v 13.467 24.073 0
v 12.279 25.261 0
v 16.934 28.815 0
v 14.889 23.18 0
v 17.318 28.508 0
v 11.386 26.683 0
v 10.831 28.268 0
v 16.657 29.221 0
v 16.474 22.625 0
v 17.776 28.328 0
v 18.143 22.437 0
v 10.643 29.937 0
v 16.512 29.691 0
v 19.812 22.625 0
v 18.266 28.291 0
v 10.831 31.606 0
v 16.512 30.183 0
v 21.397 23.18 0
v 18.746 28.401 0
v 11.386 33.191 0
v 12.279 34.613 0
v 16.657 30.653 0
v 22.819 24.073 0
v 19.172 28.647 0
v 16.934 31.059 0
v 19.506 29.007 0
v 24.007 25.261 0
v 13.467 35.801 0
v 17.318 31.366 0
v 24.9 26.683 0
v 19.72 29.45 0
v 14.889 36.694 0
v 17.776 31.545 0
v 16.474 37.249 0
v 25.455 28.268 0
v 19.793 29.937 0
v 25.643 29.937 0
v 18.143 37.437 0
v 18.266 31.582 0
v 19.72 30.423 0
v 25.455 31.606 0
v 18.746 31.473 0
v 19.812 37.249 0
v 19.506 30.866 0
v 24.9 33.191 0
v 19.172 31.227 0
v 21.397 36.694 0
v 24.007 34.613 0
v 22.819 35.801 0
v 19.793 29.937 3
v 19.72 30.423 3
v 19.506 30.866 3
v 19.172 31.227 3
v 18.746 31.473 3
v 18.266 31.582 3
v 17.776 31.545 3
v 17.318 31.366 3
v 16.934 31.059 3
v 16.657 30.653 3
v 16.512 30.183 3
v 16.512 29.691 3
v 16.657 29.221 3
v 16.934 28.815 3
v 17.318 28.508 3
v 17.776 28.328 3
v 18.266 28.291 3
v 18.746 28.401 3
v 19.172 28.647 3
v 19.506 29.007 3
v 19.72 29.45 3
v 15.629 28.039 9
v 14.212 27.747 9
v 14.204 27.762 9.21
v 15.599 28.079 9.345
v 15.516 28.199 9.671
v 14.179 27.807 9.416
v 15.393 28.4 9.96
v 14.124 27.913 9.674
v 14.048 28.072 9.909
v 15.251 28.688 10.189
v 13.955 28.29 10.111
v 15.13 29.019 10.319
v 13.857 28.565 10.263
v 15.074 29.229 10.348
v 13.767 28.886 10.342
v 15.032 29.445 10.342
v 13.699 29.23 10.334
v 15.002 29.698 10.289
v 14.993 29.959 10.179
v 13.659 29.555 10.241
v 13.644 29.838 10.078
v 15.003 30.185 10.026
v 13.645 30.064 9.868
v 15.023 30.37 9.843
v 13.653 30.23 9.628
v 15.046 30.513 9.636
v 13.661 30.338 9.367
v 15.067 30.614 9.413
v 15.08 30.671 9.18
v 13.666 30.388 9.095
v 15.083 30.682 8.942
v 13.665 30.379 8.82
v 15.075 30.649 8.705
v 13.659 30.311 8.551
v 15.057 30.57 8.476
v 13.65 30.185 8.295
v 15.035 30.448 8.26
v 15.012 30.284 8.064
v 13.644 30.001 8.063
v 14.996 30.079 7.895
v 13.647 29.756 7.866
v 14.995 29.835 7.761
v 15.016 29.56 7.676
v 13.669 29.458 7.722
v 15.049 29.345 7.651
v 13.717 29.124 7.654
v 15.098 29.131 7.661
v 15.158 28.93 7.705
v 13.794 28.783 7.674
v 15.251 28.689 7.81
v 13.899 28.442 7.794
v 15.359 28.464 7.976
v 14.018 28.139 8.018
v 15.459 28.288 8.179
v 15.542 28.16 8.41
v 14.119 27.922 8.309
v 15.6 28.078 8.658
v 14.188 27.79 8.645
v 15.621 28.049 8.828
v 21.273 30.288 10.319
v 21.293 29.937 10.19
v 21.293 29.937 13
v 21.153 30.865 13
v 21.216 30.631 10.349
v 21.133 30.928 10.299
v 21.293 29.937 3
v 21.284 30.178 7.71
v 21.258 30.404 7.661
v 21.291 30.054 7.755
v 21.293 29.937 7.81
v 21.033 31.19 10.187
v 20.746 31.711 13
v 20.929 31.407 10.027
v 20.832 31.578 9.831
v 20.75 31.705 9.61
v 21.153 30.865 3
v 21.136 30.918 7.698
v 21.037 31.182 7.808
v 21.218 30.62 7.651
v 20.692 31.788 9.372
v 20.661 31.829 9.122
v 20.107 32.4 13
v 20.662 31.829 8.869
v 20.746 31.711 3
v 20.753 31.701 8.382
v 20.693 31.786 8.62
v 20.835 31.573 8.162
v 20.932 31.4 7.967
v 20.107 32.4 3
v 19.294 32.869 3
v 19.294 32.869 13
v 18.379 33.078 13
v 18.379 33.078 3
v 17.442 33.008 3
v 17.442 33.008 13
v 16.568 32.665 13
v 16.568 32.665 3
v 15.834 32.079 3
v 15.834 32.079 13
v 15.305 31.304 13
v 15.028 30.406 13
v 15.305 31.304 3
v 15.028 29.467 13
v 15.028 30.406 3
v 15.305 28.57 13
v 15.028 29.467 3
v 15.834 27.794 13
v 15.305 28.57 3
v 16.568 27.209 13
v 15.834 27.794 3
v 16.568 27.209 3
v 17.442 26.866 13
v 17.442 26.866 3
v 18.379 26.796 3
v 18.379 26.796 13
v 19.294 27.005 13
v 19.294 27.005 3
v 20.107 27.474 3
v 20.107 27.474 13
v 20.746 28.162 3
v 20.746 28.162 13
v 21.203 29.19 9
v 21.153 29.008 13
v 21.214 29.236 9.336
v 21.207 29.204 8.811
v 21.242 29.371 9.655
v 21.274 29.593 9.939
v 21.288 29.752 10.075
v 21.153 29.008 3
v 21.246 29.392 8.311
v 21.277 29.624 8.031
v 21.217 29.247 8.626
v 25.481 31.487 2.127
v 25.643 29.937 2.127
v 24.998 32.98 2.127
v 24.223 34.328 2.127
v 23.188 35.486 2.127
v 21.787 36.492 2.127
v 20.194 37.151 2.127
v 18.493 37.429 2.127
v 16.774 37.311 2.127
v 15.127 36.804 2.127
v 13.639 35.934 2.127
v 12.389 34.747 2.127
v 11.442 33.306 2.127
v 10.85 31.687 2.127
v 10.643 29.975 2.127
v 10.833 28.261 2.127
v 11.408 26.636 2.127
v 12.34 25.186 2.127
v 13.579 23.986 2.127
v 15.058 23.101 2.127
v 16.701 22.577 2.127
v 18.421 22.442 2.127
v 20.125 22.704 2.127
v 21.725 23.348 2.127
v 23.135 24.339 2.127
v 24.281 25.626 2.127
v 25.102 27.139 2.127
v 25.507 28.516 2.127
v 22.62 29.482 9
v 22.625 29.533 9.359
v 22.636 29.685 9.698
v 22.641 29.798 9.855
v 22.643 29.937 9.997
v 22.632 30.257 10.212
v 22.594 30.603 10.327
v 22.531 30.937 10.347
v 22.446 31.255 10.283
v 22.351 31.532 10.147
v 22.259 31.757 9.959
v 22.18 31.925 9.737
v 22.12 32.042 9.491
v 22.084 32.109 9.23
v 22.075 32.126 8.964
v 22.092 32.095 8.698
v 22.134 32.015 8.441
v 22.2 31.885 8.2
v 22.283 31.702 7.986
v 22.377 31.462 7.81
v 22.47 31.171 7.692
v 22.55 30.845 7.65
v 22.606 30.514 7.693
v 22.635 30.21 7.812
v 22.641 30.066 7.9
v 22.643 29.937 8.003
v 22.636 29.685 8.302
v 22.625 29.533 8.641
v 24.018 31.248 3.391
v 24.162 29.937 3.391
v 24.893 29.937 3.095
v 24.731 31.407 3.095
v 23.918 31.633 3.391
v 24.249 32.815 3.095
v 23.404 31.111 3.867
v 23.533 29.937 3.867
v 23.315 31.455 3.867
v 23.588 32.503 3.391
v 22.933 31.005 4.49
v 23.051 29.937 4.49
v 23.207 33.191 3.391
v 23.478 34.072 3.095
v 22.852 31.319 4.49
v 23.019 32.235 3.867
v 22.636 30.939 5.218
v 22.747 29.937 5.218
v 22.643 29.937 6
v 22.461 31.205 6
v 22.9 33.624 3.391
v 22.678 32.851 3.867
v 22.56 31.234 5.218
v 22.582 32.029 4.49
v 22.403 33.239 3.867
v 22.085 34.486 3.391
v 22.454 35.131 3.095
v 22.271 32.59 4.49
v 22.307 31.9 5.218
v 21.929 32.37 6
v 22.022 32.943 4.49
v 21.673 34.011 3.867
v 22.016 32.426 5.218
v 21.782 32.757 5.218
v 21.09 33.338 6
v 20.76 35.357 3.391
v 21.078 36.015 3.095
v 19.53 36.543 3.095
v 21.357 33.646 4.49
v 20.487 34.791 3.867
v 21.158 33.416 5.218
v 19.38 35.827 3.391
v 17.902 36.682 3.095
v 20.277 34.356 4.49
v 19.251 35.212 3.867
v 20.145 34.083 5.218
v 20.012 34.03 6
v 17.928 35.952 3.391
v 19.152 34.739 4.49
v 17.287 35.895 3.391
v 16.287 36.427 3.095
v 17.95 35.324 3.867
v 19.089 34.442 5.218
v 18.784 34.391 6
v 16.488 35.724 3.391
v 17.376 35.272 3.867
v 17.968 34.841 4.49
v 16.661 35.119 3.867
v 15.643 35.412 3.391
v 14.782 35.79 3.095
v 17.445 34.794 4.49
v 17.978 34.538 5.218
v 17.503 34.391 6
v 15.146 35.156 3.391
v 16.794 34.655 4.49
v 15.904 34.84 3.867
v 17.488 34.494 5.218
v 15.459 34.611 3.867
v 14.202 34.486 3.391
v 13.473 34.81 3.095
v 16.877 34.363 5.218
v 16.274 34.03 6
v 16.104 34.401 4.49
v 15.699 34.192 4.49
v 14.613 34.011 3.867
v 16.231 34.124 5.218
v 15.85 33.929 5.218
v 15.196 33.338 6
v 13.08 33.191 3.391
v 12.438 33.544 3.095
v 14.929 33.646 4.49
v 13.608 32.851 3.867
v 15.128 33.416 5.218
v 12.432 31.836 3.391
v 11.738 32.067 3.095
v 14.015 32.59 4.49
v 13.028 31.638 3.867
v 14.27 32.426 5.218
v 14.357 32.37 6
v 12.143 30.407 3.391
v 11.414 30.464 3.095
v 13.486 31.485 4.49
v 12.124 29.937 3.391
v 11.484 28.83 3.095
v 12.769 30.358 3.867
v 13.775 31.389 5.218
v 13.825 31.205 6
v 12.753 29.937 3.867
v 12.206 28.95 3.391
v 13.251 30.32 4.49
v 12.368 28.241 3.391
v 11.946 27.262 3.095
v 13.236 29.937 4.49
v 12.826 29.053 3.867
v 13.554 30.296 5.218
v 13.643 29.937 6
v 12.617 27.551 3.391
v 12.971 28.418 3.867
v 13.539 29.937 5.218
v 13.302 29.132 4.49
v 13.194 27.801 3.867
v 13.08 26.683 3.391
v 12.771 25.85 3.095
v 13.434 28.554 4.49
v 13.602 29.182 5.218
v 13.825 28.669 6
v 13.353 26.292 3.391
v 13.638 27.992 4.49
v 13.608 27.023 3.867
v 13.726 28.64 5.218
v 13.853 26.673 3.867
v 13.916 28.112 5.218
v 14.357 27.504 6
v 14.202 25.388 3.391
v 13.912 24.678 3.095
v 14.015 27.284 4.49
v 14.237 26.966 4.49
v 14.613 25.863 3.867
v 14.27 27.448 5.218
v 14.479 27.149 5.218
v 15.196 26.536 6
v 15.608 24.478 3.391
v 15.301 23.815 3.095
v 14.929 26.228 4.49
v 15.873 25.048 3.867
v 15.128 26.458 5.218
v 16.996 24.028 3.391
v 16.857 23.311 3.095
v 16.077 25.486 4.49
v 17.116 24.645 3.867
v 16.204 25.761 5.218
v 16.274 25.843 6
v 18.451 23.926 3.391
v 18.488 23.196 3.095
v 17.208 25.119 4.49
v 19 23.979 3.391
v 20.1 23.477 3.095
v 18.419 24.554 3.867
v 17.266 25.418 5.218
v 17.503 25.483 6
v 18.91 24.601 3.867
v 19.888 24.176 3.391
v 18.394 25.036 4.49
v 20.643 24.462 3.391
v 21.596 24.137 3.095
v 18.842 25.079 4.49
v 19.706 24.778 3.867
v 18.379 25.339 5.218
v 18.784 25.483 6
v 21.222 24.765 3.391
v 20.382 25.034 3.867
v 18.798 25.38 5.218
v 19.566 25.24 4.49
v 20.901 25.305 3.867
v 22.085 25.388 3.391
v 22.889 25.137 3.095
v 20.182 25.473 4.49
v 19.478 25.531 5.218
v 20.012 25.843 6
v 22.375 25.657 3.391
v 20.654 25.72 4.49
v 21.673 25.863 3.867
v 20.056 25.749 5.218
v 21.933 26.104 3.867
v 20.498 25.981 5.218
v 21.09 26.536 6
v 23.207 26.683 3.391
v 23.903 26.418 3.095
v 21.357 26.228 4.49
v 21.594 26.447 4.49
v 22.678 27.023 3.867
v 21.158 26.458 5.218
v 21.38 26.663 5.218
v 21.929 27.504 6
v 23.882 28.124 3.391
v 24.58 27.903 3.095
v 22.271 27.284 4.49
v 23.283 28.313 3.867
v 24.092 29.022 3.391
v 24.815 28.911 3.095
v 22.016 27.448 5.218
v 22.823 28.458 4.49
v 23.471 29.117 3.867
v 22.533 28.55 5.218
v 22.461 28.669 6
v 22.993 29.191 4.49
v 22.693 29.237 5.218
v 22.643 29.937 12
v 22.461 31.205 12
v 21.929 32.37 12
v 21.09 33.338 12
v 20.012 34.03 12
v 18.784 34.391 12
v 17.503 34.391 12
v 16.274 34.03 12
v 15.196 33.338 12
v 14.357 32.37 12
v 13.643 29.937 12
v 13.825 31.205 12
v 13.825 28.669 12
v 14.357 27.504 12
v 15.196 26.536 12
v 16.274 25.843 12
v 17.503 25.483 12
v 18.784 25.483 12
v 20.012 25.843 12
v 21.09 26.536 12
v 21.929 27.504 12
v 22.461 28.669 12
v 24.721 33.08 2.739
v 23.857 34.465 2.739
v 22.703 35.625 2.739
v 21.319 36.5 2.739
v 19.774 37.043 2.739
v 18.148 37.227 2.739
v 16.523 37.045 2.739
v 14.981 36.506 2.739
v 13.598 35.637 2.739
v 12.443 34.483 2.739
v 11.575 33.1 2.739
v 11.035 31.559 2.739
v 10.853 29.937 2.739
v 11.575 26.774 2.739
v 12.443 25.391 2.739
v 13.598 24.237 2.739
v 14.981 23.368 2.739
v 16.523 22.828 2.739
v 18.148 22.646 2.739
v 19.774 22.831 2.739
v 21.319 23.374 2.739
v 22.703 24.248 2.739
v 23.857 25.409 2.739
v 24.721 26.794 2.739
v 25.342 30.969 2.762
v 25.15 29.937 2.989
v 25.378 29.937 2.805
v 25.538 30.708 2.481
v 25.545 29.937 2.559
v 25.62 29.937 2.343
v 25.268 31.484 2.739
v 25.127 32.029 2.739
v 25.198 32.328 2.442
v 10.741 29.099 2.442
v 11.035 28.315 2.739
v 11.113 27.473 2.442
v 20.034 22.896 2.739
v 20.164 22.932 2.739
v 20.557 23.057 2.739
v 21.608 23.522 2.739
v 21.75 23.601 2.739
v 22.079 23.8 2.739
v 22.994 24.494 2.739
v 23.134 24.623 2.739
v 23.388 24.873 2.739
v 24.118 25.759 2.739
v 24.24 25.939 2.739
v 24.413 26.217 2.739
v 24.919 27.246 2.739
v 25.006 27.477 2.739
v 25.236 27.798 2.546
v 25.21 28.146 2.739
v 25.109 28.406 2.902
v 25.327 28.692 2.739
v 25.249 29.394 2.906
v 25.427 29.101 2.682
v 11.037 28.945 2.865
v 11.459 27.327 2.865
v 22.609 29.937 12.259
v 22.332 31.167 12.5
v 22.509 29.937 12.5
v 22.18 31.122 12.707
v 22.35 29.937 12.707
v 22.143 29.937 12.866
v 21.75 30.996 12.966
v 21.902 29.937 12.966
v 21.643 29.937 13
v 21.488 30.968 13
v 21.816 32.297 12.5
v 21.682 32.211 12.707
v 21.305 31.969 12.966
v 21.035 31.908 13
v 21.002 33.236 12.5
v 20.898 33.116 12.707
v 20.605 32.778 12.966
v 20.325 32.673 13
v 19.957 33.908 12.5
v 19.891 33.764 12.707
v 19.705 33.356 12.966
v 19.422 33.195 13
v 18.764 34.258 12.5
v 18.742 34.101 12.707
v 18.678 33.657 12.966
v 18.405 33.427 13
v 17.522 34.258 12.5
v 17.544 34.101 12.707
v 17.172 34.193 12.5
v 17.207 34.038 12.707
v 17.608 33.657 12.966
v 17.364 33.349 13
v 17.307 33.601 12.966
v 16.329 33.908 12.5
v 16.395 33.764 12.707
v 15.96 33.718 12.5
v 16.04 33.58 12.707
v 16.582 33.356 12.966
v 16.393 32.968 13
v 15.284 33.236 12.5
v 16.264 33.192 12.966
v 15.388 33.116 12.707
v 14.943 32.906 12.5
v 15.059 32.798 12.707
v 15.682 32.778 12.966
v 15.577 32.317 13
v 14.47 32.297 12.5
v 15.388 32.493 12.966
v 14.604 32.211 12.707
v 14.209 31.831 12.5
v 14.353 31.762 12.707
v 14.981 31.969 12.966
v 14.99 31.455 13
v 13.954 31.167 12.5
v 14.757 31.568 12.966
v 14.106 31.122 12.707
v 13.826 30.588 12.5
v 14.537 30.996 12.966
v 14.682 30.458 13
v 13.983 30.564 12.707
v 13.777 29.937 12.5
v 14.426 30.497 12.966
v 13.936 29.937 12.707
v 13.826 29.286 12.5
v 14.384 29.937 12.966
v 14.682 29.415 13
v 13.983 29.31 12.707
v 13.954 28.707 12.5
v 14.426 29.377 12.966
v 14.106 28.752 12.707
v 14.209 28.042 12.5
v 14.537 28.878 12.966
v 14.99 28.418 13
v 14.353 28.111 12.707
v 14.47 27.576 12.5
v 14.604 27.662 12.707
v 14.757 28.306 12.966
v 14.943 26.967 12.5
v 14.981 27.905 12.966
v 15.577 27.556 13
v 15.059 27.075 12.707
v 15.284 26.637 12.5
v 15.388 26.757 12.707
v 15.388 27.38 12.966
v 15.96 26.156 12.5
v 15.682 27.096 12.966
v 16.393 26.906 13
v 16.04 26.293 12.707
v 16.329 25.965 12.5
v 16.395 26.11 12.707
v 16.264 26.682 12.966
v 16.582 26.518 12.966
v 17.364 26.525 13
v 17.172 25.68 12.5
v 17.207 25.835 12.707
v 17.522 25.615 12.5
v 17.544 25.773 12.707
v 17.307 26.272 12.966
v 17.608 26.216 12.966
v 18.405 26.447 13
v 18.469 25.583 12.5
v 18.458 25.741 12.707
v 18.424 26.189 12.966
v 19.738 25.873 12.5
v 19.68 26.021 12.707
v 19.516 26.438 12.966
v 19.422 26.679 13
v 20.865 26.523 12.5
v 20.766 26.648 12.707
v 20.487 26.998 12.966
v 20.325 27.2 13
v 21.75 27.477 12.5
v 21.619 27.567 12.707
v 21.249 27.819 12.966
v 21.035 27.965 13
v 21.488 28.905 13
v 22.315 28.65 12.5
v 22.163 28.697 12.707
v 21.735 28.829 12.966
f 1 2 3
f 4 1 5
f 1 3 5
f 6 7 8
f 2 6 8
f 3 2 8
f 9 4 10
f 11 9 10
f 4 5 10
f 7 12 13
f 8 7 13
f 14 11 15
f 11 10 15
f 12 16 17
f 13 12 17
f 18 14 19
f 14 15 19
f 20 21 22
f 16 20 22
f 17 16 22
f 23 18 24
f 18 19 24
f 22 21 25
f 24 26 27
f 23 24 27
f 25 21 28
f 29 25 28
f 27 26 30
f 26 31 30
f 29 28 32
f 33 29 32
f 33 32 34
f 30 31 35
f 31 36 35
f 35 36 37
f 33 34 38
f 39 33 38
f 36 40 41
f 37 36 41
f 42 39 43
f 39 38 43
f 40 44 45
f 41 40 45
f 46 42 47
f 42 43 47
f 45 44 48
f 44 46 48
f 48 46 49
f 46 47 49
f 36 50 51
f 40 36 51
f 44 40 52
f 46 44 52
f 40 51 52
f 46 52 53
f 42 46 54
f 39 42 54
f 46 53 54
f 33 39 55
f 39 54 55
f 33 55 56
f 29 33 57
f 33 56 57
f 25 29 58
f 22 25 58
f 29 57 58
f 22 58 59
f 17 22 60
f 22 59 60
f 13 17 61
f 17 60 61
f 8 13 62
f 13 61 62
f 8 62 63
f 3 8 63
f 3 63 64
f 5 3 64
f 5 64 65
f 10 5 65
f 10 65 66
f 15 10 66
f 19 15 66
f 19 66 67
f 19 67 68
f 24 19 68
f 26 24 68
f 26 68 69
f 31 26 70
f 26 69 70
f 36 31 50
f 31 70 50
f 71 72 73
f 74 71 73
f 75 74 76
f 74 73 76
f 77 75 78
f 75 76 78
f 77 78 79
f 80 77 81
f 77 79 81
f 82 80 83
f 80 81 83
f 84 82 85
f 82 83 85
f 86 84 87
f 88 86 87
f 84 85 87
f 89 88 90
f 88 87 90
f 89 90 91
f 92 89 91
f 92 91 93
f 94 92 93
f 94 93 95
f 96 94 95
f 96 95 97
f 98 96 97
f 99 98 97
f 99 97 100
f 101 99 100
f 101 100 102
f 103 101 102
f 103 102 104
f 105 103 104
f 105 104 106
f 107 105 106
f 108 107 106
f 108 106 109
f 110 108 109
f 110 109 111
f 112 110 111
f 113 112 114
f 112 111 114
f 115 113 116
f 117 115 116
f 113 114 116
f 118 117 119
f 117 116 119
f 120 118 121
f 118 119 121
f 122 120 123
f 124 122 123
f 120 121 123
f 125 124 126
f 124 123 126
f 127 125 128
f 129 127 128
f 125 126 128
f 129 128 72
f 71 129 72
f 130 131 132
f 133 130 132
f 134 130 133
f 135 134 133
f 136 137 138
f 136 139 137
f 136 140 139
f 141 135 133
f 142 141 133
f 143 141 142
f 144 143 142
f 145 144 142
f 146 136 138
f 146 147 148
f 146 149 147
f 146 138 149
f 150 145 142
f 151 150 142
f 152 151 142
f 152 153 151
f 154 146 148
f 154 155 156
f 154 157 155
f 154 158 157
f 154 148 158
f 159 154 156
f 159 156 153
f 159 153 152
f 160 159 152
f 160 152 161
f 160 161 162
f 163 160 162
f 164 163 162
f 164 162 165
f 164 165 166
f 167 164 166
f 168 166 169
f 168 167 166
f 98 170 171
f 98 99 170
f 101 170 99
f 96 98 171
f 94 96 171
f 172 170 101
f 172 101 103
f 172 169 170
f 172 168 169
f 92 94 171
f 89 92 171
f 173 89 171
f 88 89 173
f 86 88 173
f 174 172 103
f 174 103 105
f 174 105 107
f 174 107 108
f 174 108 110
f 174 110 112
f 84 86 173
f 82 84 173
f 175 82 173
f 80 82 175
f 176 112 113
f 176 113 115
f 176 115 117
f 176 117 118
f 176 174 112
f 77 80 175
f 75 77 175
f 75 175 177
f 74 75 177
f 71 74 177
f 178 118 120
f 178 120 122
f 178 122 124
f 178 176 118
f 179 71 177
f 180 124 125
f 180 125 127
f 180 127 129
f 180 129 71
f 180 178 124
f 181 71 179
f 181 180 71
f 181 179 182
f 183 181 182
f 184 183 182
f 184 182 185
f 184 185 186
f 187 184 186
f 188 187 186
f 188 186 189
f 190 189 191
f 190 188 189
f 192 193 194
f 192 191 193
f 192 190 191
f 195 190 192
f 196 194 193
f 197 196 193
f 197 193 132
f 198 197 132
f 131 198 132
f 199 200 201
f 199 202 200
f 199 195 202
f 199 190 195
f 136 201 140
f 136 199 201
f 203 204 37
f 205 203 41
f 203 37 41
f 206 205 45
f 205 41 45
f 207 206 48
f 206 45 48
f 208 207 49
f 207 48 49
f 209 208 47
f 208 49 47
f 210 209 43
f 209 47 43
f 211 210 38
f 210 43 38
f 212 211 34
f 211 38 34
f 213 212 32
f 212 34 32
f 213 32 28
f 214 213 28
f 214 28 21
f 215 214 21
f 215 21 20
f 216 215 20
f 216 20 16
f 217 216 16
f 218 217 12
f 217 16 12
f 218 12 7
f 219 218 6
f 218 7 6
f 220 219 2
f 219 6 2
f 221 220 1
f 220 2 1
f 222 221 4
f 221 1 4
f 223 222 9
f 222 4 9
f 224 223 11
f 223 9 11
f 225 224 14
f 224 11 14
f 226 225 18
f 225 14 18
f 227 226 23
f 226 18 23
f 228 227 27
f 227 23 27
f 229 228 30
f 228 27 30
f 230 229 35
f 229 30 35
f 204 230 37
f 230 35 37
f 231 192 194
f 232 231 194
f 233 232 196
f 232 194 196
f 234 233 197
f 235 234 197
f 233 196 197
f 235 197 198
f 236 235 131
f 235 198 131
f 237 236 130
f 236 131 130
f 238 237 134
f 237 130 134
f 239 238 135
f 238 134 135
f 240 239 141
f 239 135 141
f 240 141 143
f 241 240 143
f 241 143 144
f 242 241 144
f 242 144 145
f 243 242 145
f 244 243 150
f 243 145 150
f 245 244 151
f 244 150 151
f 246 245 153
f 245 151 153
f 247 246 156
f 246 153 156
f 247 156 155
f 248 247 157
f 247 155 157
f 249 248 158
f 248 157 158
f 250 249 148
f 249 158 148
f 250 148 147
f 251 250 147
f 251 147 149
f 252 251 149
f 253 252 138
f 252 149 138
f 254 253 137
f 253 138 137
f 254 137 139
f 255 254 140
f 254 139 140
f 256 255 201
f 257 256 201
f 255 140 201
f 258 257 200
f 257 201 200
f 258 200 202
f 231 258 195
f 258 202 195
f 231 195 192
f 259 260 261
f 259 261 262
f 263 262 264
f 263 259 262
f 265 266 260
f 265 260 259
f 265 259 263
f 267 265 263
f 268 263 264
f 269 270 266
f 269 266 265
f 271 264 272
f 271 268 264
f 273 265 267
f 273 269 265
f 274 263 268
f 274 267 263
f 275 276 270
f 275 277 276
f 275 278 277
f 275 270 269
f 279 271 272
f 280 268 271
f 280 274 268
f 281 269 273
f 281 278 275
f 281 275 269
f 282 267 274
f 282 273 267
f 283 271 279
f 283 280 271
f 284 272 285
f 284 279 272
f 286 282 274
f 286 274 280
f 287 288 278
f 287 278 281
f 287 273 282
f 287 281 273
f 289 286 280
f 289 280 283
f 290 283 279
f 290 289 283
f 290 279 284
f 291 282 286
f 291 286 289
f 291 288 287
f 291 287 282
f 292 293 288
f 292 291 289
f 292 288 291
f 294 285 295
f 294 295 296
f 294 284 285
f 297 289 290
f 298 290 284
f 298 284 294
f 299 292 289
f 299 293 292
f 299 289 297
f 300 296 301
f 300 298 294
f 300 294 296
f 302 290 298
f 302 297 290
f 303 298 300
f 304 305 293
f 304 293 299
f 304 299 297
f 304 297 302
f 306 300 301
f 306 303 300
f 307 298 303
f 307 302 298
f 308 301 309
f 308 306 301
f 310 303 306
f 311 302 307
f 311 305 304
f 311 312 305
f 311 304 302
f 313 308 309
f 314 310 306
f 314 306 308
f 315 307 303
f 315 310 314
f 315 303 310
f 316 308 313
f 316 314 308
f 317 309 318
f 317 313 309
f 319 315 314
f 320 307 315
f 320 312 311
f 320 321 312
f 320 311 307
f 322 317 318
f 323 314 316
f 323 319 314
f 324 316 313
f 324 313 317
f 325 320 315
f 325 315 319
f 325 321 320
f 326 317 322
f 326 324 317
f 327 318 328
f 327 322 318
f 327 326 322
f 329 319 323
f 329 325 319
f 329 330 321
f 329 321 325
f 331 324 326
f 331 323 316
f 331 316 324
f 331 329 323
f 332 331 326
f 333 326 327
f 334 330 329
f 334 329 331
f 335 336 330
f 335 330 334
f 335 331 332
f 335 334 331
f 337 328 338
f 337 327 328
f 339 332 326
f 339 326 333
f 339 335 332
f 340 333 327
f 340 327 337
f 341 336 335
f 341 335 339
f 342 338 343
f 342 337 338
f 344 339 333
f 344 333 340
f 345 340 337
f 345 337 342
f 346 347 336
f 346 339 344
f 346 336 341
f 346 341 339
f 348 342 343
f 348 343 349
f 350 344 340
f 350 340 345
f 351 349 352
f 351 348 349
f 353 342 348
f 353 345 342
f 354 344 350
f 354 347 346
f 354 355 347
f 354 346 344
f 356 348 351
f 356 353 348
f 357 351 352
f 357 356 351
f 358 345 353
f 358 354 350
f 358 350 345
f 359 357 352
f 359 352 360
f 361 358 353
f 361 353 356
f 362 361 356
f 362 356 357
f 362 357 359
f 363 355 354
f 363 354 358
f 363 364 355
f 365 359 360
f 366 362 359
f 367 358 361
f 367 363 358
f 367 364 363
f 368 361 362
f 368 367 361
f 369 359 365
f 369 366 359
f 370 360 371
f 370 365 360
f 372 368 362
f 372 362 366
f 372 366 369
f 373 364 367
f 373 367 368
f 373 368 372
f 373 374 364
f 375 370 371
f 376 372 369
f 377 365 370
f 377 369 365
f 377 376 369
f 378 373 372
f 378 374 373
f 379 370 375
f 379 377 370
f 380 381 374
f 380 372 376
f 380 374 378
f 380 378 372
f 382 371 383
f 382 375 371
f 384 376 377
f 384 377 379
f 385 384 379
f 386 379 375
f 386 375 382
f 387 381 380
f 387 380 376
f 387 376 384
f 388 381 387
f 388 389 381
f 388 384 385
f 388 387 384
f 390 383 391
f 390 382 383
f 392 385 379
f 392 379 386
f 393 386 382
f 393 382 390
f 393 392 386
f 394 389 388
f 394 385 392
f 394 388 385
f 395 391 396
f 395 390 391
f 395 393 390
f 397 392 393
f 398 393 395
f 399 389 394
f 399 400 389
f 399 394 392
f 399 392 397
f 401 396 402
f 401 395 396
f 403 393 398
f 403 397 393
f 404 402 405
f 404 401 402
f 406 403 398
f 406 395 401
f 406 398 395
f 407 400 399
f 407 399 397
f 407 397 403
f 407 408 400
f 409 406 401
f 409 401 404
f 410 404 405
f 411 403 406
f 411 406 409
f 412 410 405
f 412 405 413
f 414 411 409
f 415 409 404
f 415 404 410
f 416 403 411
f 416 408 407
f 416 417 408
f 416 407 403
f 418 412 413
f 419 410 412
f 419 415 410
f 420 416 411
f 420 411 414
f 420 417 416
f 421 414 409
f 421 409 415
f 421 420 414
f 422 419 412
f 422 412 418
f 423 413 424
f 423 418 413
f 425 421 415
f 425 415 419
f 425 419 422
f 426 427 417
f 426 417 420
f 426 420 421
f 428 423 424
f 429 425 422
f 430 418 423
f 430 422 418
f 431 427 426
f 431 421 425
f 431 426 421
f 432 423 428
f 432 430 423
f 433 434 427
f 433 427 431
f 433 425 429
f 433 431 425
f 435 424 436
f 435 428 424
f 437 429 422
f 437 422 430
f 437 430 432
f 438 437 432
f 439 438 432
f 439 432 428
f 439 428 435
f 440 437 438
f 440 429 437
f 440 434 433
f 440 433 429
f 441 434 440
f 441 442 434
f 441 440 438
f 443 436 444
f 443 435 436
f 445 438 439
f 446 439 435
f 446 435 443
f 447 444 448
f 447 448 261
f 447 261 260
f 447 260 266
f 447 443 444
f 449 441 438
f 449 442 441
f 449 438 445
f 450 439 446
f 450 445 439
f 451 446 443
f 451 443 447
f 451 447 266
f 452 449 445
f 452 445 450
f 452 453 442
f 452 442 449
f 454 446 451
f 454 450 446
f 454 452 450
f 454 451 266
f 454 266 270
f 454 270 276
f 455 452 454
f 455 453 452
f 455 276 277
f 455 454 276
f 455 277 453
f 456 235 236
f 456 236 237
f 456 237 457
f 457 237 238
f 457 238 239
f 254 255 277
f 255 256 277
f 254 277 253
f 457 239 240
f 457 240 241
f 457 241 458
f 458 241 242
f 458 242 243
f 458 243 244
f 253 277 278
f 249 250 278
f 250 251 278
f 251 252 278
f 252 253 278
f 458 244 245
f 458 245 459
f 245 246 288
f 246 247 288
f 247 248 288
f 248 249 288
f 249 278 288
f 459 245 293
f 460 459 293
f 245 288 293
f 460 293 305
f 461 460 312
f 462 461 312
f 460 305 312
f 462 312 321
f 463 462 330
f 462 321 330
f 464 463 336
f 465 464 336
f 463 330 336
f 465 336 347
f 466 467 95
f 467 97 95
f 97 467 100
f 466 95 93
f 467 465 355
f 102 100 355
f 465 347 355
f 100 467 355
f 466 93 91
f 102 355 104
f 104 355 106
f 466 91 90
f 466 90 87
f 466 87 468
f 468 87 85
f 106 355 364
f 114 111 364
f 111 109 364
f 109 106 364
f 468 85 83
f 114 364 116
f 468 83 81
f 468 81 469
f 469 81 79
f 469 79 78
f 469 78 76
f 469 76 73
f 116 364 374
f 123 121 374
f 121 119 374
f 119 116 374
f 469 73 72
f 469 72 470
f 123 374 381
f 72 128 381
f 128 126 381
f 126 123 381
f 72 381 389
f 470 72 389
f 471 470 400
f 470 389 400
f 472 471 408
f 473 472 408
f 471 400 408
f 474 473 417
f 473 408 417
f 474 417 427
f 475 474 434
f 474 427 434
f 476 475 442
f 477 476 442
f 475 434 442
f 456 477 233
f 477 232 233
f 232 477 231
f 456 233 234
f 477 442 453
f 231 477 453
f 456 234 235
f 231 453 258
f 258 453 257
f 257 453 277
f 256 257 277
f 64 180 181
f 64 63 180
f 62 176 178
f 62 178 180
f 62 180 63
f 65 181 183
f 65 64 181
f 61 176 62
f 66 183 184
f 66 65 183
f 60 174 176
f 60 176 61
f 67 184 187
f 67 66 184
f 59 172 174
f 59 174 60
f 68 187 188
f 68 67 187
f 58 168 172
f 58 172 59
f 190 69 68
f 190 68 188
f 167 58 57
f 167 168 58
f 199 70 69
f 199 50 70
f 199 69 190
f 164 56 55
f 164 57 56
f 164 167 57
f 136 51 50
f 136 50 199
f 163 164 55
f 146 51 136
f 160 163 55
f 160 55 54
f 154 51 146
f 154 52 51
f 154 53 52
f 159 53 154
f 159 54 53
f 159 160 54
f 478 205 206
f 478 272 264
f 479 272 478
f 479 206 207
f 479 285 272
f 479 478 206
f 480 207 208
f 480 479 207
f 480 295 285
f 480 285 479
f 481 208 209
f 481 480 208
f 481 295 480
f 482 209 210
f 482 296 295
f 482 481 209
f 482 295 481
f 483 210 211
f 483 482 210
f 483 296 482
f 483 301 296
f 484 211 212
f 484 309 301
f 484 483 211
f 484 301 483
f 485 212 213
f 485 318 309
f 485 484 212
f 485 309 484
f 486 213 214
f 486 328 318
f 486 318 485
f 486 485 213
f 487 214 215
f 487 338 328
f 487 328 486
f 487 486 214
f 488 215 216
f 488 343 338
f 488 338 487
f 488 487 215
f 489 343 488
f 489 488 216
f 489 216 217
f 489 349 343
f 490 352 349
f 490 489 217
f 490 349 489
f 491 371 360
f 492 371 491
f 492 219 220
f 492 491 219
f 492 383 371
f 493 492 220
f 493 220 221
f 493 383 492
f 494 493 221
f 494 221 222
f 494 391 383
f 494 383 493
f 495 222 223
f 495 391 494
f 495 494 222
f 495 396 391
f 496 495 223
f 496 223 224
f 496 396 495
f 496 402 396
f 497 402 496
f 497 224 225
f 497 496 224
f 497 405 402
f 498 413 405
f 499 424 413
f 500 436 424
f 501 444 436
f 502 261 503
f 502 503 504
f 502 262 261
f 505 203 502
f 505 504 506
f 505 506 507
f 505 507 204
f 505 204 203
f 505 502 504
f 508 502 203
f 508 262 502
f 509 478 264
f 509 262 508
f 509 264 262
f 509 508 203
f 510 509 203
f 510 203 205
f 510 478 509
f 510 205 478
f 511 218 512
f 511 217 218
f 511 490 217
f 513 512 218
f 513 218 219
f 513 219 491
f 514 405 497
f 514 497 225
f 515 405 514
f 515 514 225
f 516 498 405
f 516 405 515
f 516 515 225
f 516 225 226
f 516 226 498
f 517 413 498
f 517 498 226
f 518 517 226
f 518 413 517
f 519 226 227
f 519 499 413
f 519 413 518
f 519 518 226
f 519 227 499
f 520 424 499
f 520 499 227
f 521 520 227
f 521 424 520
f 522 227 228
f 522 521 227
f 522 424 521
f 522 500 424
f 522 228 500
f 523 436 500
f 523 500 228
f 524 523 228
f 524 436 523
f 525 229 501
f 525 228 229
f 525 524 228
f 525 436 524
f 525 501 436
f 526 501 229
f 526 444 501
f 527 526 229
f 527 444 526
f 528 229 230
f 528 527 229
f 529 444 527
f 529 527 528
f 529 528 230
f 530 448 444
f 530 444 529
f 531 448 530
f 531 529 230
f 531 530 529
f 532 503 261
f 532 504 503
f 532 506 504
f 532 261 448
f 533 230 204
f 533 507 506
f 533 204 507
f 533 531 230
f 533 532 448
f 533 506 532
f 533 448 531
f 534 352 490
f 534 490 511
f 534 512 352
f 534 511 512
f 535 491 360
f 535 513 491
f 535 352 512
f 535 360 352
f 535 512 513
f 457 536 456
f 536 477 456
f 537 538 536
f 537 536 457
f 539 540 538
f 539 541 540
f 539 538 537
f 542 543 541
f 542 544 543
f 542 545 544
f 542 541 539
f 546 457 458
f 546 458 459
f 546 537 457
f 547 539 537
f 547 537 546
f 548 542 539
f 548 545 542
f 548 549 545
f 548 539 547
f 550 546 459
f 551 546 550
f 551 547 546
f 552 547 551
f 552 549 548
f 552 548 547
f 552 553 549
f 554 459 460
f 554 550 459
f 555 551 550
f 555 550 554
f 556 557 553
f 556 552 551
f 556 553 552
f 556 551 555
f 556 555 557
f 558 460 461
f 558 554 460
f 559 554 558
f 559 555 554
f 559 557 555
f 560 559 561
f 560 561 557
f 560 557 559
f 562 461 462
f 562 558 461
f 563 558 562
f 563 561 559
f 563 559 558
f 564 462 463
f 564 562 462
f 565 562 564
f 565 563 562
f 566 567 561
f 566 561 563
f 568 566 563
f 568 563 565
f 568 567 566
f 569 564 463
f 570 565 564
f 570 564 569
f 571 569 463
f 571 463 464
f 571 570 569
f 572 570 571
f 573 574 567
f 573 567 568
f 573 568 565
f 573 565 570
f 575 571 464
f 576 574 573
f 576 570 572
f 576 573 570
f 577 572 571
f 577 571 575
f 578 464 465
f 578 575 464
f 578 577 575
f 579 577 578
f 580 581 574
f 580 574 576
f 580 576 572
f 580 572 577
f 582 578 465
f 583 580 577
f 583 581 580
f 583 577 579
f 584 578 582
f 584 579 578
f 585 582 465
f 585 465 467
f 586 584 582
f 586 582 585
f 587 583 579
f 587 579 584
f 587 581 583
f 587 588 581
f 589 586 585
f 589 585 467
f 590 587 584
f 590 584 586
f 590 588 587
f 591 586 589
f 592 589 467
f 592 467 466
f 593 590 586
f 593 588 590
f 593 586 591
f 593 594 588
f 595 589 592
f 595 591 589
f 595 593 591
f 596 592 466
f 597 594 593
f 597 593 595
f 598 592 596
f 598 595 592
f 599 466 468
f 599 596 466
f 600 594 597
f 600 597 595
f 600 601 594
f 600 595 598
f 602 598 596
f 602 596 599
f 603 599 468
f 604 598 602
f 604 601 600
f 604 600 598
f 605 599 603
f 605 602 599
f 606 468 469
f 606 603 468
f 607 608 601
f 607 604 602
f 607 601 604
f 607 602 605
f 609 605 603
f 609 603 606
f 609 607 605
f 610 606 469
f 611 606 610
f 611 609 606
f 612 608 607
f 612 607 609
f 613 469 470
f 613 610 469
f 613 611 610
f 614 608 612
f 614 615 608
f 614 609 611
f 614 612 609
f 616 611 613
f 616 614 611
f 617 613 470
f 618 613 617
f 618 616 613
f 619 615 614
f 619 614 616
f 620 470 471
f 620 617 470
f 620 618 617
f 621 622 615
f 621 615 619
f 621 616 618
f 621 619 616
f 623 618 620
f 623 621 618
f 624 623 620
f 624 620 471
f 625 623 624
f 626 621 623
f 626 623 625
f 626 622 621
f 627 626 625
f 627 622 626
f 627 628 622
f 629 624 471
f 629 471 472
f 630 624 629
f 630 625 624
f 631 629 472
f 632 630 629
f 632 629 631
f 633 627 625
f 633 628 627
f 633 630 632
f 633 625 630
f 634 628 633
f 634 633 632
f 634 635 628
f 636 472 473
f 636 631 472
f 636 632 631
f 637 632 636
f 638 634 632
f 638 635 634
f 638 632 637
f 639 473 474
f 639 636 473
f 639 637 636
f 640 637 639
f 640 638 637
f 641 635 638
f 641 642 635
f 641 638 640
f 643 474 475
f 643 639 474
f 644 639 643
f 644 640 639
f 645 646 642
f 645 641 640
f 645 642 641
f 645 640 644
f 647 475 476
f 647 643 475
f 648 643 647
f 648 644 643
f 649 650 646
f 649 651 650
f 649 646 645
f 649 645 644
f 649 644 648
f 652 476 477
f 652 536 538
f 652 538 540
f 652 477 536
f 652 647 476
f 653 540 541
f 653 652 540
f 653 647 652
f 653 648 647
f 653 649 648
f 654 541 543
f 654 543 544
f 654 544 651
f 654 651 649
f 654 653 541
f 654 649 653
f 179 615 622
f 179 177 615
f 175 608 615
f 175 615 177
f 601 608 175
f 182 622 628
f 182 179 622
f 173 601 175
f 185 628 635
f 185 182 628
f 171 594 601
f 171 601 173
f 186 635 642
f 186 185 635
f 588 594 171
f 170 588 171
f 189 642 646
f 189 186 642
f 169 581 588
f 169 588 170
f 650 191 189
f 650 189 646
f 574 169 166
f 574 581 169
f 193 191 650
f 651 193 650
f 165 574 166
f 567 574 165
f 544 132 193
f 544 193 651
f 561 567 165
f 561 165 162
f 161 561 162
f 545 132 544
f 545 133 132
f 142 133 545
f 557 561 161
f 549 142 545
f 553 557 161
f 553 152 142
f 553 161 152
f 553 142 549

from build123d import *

# Parameters (mm, degrees)
SKETCH_6_R          = 7.5
EXTRUDE_1_DEPTH     = 3
SKETCH_7_R          = 4.5
SKETCH_7_R_2        = 3.15
EXTRUDE_2_DEPTH     = 10
FILLET_1_R          = 3
SKETCH_9_R          = 1.65
CUT_EXTRUDE_1_DEPTH = 3
FILLET_2_R          = 1
SKETCH_10_R         = 1.35
CUT_EXTRUDE_2_DEPTH = 37.90351326


with BuildPart() as part:
    # 草图6 → 凸台-拉伸1 (new body)
    with BuildSketch(Plane.XY):
        with Locations((18.143108258, 29.936835998)):
            Circle(SKETCH_6_R)
    extrude(amount=EXTRUDE_1_DEPTH)

    # 草图7 → 凸台-拉伸2 (add)
    with BuildSketch(Plane.XY.offset(3)):
        with Locations((18.143108258, 29.936835998)):
            Circle(SKETCH_7_R)
        with Locations((18.143108258, 29.936835998)):
            Circle(SKETCH_7_R_2, mode=Mode.SUBTRACT)
    extrude(amount=EXTRUDE_2_DEPTH)

    # 圆角1
    fillet_1_edges = [part.edges().sort_by_distance(p)[0] for p in [
        (13.643108258, 29.936835998, 3),
    ]]
    fillet(fillet_1_edges, radius=FILLET_1_R - 0.0001)  # a hair under: the kernel refuses the full size

    # 草图9 → 切除-拉伸1 (cut)
    with BuildSketch(Plane.XY.offset(3)):
        with Locations((18.143108258, 29.936835998)):
            Circle(SKETCH_9_R)
    extrude(amount=-CUT_EXTRUDE_1_DEPTH, mode=Mode.SUBTRACT)

    # 圆角2
    fillet_2_edges = [part.edges().sort_by_distance(p)[0] for p in [
        (10.643108258, 29.936835998, 3),
        (13.643108258, 29.936835998, 13),
    ]]
    fillet(fillet_2_edges, radius=FILLET_2_R)

    # 草图10 → 切除-拉伸2 (cut, through all)
    with BuildSketch(Plane(origin=(18.921476442, 3.905687751, 0), x_dir=(0, 0, 1), z_dir=(-0.9793537694565077, -0.20215388754938593, 0))):
        with Locations(Location((9, 25.651053313, 0), (0, 0, 270))):
            Circle(SKETCH_10_R)
    extrude(amount=-CUT_EXTRUDE_2_DEPTH, mode=Mode.SUBTRACT)


solid = part.part
